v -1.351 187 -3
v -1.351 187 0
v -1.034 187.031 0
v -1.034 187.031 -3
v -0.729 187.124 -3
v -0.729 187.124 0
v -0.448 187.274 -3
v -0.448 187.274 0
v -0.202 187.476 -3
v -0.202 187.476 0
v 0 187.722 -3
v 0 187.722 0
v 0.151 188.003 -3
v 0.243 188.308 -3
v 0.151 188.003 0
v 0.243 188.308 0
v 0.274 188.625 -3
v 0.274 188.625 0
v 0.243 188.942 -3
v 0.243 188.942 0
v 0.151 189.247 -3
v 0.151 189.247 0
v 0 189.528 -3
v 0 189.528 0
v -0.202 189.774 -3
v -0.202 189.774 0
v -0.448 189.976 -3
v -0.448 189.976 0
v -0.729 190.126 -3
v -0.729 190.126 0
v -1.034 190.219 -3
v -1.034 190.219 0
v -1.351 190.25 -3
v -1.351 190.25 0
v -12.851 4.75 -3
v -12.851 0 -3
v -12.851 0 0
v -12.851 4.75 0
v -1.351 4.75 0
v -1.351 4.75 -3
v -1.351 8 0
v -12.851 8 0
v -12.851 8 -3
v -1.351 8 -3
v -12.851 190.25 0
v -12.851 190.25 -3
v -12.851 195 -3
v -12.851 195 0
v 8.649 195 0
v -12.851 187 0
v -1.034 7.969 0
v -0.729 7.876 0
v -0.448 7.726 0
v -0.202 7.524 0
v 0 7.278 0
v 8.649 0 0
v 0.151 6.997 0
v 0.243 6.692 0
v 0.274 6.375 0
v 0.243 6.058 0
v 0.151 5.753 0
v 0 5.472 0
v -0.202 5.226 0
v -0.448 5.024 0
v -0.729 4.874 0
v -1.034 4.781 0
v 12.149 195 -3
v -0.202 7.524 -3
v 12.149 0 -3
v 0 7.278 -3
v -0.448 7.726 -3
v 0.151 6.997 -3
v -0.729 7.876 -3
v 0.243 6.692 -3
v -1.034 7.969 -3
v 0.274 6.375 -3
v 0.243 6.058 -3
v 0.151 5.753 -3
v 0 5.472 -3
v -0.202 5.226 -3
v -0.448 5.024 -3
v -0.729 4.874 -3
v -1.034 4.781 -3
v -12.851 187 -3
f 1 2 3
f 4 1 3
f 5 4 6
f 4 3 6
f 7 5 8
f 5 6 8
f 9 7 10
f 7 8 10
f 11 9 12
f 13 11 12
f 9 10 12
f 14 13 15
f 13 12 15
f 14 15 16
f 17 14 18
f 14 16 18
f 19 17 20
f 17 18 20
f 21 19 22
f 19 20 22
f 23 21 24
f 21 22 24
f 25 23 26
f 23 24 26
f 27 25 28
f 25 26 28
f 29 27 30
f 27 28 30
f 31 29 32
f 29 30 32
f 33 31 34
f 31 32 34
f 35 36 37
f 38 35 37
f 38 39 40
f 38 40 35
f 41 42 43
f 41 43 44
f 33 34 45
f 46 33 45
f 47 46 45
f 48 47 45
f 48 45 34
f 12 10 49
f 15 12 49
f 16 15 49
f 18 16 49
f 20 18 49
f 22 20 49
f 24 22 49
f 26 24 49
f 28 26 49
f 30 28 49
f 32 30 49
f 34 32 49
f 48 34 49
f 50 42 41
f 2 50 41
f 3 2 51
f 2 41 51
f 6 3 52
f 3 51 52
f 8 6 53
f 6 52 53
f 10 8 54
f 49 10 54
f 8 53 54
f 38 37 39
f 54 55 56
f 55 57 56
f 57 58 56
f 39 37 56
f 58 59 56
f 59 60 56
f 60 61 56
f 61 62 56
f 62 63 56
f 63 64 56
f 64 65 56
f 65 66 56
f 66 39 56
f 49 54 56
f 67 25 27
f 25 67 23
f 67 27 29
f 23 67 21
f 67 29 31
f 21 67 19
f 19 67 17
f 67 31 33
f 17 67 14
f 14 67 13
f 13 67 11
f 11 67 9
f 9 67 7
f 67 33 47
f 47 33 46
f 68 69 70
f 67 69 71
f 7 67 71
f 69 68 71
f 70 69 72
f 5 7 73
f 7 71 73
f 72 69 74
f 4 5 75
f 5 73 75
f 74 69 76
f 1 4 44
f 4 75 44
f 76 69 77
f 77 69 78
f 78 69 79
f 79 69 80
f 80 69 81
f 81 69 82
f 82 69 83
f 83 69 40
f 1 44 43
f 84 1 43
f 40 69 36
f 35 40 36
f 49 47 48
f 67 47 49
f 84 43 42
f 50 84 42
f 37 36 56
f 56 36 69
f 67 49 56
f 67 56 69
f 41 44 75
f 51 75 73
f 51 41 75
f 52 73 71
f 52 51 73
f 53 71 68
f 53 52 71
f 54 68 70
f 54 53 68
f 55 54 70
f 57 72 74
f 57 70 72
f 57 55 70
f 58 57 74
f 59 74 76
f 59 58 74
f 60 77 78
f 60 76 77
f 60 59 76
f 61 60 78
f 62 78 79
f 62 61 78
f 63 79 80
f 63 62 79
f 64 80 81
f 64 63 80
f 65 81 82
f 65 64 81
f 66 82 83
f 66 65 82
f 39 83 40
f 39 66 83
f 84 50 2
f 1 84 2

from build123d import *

# Parameters (mm, degrees)
BOSS_EXTRUDE1_DEPTH   = 195
CORTAR_EXTRUIR4_DEPTH = 10


with BuildPart() as part:
    # Sketch1 → Boss-Extrude1 (new body)
    with BuildSketch(Plane(origin=(0, 0, 0), x_dir=(1, 0, 0), z_dir=(0, 1, 0))):
        Polygon((-12.850649351, 0), (8.649350649, 0), (12.149350649, 3), (-12.850649351, 3), align=None)
    extrude(amount=BOSS_EXTRUDE1_DEPTH)

    # Croquis1 → Cortar-Extruir4 (cut)
    with BuildSketch(Plane.XY):
        with BuildLine():
            Line((-1.350649351, 4.75), (-12.850649351, 4.75))
            Line((-12.850649351, 4.75), (-12.850649351, 8))
            Line((-12.850649351, 8), (-1.350649351, 8))
            ThreePointArc((-1.350649351, 8), (0.274350649, 6.375), (-1.350649351, 4.75))
        make_face()
        with BuildLine():
            Line((-12.850649351, 187), (-1.350649351, 187))
            ThreePointArc((-1.350649351, 187), (0.274350649, 188.625), (-1.350649351, 190.25))
            Line((-1.350649351, 190.25), (-12.850649351, 190.25))
            Line((-12.850649351, 190.25), (-12.850649351, 187))
        make_face()
    extrude(amount=-CORTAR_EXTRUIR4_DEPTH, mode=Mode.SUBTRACT)


solid = part.part
